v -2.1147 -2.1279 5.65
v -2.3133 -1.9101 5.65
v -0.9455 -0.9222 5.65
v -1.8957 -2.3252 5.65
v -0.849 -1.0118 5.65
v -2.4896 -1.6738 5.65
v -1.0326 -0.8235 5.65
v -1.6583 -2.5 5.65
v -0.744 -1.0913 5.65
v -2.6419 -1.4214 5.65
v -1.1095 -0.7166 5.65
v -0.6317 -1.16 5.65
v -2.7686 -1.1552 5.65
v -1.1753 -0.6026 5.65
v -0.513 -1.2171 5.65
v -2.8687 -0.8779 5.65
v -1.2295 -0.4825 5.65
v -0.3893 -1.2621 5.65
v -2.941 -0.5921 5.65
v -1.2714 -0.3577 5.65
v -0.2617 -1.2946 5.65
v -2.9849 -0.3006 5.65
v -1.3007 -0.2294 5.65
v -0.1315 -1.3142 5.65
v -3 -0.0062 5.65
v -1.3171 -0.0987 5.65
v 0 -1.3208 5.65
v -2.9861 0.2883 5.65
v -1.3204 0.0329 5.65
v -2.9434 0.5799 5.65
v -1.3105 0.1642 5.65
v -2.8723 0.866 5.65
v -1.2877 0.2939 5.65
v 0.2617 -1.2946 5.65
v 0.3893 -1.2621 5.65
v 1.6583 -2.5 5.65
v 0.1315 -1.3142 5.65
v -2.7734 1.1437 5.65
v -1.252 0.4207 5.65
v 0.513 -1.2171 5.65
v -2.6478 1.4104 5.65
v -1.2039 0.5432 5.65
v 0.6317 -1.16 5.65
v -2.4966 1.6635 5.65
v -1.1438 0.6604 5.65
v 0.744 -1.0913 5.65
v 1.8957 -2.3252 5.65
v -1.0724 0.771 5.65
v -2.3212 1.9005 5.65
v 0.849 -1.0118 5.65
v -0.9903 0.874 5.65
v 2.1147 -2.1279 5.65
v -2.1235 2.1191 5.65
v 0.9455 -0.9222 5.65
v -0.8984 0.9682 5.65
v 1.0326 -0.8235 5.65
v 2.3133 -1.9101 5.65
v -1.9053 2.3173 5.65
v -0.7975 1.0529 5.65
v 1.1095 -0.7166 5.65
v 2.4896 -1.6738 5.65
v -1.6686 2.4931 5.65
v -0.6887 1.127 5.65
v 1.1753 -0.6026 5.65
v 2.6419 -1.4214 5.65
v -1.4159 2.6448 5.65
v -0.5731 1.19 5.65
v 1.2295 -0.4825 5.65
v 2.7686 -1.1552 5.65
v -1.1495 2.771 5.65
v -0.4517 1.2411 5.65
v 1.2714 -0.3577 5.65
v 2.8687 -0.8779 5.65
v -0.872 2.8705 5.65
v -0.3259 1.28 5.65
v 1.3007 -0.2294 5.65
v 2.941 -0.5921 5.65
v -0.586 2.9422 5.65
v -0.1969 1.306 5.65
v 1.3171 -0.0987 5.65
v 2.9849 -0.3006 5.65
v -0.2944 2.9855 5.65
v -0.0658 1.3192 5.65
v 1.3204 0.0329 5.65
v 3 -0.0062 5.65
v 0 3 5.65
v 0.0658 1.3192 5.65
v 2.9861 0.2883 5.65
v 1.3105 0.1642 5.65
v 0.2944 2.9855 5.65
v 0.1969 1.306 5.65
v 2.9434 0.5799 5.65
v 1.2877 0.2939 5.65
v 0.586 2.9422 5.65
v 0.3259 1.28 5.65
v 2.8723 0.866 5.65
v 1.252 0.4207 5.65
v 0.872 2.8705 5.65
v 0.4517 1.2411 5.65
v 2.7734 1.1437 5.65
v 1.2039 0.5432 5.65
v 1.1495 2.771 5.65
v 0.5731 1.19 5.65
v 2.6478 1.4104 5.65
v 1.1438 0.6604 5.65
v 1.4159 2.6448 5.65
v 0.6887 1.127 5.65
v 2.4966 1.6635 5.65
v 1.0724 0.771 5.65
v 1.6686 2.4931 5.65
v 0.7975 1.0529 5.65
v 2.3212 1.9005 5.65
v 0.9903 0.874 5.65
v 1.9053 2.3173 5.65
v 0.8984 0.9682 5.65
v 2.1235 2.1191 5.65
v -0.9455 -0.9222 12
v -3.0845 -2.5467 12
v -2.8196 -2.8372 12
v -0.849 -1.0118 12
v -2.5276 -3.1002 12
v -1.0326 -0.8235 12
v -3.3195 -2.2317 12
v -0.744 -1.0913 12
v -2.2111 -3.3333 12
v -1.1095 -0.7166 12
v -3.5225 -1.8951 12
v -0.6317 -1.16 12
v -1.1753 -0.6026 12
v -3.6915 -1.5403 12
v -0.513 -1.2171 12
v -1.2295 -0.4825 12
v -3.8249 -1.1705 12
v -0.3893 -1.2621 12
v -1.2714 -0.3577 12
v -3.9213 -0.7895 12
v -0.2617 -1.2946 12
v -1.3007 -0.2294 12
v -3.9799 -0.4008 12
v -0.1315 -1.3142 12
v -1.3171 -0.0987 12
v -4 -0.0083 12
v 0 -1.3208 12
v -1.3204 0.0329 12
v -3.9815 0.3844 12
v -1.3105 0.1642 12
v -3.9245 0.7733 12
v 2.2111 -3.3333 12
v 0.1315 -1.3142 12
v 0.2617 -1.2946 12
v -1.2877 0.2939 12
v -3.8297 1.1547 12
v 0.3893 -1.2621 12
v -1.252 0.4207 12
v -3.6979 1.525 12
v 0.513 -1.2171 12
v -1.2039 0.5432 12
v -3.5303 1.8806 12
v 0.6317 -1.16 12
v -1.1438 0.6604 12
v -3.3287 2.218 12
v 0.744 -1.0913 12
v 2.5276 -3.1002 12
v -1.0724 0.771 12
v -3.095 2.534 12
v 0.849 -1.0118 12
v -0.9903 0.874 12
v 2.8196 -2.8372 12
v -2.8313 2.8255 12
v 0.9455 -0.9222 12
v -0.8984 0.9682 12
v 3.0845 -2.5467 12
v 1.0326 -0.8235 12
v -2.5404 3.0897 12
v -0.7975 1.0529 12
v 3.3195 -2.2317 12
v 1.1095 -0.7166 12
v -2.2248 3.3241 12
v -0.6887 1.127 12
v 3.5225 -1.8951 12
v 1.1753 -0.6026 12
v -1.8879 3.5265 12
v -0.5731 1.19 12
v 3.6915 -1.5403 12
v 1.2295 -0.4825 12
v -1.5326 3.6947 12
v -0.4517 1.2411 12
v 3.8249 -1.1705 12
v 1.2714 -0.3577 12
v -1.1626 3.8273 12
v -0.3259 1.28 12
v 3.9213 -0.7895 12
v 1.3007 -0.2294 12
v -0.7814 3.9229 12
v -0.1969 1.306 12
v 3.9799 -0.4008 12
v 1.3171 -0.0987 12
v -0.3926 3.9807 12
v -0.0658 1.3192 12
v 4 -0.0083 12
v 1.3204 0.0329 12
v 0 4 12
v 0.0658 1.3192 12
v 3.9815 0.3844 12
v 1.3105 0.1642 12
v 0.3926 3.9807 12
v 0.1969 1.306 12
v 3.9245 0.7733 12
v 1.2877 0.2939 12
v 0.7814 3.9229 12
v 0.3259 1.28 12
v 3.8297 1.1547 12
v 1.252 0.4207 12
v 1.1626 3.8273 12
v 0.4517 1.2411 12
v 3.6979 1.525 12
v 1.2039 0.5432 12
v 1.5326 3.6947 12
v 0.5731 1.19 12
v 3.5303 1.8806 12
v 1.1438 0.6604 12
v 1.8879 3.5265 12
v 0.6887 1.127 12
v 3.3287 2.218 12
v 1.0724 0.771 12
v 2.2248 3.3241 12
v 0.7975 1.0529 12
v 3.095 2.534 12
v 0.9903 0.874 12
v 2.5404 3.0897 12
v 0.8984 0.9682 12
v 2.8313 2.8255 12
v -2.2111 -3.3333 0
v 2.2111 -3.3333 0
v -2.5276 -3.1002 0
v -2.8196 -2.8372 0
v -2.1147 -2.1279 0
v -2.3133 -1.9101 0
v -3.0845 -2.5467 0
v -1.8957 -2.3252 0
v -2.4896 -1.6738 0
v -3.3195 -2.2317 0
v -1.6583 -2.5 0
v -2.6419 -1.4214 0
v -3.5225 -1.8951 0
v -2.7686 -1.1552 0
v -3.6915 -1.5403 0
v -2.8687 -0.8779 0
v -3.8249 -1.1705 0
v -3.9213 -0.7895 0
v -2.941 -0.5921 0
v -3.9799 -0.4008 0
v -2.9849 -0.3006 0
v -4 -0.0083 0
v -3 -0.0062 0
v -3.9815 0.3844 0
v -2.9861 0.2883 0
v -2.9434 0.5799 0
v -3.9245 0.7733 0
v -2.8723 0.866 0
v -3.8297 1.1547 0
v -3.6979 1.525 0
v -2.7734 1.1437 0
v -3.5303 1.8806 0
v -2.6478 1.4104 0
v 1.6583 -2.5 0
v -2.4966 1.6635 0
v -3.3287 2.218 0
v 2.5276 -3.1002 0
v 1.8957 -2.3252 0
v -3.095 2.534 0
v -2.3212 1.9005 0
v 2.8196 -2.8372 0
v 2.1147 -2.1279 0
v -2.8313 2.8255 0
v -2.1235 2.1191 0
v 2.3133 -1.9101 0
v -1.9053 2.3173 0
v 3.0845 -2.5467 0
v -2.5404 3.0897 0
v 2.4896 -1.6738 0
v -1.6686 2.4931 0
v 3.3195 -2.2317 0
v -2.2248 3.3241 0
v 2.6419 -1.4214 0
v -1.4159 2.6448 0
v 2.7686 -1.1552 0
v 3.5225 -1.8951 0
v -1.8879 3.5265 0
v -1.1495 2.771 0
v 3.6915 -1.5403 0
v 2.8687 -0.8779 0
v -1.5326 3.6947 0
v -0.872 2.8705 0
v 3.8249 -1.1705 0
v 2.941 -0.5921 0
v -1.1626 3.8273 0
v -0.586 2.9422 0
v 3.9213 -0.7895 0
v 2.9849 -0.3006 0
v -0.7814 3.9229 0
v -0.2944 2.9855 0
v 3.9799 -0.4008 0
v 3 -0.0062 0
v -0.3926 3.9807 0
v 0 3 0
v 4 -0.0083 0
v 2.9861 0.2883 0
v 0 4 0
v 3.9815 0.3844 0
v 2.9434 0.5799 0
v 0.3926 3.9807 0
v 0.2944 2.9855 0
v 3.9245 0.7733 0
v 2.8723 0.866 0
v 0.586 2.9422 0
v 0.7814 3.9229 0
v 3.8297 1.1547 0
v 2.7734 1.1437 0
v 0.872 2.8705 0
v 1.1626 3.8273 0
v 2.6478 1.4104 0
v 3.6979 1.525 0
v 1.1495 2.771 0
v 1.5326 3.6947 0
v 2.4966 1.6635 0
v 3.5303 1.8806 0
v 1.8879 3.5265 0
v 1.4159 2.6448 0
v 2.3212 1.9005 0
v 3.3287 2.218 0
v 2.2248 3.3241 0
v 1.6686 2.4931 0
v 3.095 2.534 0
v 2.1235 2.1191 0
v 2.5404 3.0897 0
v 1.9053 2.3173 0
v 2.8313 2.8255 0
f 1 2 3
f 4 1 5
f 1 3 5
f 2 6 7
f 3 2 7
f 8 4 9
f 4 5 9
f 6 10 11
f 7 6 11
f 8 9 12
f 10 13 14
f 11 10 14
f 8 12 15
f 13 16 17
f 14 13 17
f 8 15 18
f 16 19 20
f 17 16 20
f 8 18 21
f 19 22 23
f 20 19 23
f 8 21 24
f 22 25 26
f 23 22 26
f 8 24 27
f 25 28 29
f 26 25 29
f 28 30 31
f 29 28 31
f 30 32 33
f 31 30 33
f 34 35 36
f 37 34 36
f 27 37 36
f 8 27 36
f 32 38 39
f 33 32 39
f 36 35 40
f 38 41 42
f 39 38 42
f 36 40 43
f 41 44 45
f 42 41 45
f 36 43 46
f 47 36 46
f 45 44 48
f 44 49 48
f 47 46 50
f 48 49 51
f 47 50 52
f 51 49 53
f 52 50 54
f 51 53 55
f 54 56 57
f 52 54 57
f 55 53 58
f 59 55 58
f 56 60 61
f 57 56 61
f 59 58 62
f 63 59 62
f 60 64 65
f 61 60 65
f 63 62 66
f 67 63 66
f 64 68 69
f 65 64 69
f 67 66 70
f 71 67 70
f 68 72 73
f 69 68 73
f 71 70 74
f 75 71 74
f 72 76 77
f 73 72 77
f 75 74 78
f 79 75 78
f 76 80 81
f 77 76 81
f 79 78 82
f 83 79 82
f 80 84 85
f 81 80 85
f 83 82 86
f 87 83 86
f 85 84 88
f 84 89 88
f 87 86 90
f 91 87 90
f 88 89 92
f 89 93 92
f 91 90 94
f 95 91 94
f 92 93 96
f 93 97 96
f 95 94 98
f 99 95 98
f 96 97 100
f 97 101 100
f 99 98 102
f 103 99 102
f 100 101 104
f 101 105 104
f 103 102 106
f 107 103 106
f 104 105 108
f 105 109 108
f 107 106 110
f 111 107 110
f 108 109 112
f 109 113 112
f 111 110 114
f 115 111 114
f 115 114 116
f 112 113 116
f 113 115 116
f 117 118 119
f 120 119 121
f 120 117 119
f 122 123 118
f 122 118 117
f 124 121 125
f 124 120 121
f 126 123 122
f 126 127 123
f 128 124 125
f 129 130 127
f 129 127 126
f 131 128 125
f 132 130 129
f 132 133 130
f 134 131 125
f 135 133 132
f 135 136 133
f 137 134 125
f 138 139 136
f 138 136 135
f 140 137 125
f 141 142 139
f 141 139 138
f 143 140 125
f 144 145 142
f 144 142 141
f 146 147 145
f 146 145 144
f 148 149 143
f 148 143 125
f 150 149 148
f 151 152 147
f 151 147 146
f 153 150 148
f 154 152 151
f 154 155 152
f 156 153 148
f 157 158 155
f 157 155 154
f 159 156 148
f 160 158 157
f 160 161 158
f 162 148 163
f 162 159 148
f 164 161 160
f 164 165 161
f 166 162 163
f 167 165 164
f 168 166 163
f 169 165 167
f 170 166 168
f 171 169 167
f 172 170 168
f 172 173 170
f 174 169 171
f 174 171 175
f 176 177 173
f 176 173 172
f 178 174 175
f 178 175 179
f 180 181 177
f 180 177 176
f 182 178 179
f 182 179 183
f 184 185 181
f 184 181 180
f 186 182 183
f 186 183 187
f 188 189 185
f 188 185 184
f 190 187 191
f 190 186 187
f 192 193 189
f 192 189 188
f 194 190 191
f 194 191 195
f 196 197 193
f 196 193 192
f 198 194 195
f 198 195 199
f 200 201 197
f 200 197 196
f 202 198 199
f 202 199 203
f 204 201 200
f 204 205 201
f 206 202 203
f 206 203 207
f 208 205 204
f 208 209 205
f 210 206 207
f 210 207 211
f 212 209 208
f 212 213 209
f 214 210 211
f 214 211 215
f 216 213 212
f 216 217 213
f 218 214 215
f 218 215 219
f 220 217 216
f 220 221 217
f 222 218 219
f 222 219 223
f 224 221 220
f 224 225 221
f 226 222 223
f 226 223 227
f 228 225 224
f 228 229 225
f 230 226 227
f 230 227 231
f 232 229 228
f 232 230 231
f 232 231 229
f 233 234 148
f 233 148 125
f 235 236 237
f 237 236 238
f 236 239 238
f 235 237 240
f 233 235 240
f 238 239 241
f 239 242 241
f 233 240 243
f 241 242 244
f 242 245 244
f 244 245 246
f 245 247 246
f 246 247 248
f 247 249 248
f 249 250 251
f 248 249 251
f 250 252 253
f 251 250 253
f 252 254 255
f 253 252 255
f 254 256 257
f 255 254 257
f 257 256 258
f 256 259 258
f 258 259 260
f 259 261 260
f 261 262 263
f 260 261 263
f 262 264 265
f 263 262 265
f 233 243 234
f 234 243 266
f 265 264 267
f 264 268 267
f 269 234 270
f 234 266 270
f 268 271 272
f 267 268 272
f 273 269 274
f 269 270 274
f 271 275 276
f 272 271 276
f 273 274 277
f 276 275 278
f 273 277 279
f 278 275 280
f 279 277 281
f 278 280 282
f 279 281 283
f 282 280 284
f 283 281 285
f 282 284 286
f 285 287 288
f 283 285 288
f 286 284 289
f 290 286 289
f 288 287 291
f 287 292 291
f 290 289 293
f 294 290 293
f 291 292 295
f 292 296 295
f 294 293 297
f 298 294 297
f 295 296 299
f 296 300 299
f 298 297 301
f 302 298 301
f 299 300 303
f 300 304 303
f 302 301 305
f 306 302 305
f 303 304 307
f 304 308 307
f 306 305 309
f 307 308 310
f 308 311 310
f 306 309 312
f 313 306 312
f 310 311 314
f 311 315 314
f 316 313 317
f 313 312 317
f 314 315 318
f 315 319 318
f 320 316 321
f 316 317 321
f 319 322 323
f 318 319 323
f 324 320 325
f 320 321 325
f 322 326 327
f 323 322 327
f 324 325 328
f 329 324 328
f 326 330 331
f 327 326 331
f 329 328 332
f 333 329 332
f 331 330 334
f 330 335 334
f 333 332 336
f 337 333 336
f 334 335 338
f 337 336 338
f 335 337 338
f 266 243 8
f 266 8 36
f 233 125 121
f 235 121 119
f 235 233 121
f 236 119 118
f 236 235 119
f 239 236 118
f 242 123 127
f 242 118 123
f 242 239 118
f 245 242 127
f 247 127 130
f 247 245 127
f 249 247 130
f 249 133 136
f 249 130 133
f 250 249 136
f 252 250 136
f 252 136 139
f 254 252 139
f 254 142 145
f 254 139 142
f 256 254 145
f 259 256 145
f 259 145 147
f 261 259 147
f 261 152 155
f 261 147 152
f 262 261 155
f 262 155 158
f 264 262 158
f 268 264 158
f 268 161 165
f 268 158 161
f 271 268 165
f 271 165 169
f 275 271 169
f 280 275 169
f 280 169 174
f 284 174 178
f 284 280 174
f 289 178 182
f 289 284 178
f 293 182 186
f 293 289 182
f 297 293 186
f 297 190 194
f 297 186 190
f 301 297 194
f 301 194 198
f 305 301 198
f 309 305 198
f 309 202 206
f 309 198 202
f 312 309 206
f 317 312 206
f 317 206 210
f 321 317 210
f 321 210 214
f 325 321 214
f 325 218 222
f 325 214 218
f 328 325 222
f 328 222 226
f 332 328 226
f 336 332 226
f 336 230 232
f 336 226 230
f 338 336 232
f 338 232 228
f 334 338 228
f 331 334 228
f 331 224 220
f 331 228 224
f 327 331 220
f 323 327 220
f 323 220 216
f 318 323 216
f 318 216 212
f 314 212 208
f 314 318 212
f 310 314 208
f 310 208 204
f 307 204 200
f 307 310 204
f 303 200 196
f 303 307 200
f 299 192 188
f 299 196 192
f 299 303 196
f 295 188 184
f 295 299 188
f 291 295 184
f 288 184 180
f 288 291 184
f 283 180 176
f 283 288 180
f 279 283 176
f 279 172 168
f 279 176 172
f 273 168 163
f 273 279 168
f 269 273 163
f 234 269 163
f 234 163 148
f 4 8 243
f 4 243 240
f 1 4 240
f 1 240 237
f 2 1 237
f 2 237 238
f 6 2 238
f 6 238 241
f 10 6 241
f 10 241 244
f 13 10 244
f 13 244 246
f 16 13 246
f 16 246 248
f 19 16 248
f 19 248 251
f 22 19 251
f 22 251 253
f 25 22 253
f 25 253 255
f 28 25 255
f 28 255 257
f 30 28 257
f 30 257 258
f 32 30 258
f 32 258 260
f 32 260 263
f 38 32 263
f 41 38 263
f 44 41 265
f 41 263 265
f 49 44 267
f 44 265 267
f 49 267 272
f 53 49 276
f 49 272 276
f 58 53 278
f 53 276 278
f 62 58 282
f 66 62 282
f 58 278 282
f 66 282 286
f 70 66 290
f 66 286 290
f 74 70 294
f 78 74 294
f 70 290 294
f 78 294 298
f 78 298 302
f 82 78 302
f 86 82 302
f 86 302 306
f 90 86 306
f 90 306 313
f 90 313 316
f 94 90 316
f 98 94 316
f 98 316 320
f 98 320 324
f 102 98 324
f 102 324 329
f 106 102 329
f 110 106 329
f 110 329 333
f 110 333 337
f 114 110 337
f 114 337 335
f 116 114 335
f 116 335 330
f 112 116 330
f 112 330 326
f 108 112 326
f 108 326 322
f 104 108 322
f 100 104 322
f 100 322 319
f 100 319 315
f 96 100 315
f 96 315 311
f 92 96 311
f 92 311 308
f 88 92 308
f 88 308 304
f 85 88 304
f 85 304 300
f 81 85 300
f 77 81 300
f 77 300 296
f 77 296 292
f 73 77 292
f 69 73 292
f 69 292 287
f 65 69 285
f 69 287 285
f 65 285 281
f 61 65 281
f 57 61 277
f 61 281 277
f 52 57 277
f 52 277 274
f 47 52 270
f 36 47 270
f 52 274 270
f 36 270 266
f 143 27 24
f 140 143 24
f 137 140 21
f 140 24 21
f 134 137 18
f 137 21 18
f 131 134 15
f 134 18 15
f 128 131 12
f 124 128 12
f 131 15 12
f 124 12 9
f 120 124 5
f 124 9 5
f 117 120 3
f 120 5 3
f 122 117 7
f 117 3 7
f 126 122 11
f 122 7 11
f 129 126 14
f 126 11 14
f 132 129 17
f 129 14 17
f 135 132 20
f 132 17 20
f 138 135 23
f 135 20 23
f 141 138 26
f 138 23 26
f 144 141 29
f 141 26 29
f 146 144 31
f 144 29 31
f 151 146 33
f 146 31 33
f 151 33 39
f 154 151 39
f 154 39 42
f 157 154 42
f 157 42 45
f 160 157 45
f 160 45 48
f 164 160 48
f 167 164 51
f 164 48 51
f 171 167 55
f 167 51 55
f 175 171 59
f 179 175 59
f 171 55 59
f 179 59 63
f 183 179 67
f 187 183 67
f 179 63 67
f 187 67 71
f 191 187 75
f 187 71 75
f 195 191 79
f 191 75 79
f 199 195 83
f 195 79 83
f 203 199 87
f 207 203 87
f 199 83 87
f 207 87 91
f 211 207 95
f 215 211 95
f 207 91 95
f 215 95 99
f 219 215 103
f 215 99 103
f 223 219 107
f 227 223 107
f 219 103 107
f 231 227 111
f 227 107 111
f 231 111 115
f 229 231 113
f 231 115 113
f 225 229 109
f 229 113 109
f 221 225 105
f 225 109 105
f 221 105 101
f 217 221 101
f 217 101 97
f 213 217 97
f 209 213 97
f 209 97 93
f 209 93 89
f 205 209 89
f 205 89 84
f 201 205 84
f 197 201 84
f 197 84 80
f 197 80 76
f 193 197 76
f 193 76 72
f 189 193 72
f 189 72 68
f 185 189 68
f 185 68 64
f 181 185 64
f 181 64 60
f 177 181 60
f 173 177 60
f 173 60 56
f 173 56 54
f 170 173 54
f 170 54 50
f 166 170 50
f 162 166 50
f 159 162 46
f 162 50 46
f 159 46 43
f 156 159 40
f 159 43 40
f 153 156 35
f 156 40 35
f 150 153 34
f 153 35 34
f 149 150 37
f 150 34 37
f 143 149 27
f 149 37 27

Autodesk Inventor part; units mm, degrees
ref_plane "YZ Plane" through (0, 0, 0) normal (1, 0, 0) x (0, 1, 0)
ref_plane "XZ Plane" through (0, 0, 0) normal (0, 1, 0) x (-1, 0, 0)
ref_plane "XY Plane" through (0, 0, 0) normal (0, 0, 1) x (1, 0, 0)
sketch "Sketch1" plane through (0, 0, 0) normal (0, 0, 1) x (1, 0, 0)
  line L0 (-1.6583, -2.5) -> (1.6583, -2.5)
  arc A0 (1.6583, -2.5) -> (-1.6583, -2.5) centre (0, 0) ccw
  arc A1 (2.2111, -3.3333) -> (-2.2111, -3.3333) centre (0, 0) ccw
  line L1 (2.2111, -3.3333) -> (-2.2111, -3.3333)
  dimension "d0" = 1
  dimension "d1" = 3
  dimension "d2" = 3.3166
  dimension "d3" = 0.8333
  dimension "d4" = 3.3333
  dimension "d5" = 3.3333
  dimension "d6" = 4
  dimension "d7" = 0
extrude "Extrusion1" add sketch "Sketch1" along normal blind 12
sketch "Sketch2" plane through (0, 0, 12) normal (0, 0, 1) x (1, 0, 0)
  arc A0 (2.2111, -3.3333) -> (-2.2111, -3.3333) centre (0, 0) ccw projected
  line L0 (-2.2111, -3.3333) -> (2.2111, -3.3333) projected
extrude "Extrusion2" add sketch "Sketch2" against normal blind 6.35
sketch "Sketch3" plane through (0, 0, 12) normal (0, 0, 1) x (1, 0, 0)
  point P0 (0, 0)
hole "Hole1" at (0, 0, 12) direction (0, 0, -1) diameter 2.6416 end through all thread size "6-32 UNC" class "2B" standard "ANSI Unified Screw Threads"
properties part number "ShaftD6Female-632Female"
